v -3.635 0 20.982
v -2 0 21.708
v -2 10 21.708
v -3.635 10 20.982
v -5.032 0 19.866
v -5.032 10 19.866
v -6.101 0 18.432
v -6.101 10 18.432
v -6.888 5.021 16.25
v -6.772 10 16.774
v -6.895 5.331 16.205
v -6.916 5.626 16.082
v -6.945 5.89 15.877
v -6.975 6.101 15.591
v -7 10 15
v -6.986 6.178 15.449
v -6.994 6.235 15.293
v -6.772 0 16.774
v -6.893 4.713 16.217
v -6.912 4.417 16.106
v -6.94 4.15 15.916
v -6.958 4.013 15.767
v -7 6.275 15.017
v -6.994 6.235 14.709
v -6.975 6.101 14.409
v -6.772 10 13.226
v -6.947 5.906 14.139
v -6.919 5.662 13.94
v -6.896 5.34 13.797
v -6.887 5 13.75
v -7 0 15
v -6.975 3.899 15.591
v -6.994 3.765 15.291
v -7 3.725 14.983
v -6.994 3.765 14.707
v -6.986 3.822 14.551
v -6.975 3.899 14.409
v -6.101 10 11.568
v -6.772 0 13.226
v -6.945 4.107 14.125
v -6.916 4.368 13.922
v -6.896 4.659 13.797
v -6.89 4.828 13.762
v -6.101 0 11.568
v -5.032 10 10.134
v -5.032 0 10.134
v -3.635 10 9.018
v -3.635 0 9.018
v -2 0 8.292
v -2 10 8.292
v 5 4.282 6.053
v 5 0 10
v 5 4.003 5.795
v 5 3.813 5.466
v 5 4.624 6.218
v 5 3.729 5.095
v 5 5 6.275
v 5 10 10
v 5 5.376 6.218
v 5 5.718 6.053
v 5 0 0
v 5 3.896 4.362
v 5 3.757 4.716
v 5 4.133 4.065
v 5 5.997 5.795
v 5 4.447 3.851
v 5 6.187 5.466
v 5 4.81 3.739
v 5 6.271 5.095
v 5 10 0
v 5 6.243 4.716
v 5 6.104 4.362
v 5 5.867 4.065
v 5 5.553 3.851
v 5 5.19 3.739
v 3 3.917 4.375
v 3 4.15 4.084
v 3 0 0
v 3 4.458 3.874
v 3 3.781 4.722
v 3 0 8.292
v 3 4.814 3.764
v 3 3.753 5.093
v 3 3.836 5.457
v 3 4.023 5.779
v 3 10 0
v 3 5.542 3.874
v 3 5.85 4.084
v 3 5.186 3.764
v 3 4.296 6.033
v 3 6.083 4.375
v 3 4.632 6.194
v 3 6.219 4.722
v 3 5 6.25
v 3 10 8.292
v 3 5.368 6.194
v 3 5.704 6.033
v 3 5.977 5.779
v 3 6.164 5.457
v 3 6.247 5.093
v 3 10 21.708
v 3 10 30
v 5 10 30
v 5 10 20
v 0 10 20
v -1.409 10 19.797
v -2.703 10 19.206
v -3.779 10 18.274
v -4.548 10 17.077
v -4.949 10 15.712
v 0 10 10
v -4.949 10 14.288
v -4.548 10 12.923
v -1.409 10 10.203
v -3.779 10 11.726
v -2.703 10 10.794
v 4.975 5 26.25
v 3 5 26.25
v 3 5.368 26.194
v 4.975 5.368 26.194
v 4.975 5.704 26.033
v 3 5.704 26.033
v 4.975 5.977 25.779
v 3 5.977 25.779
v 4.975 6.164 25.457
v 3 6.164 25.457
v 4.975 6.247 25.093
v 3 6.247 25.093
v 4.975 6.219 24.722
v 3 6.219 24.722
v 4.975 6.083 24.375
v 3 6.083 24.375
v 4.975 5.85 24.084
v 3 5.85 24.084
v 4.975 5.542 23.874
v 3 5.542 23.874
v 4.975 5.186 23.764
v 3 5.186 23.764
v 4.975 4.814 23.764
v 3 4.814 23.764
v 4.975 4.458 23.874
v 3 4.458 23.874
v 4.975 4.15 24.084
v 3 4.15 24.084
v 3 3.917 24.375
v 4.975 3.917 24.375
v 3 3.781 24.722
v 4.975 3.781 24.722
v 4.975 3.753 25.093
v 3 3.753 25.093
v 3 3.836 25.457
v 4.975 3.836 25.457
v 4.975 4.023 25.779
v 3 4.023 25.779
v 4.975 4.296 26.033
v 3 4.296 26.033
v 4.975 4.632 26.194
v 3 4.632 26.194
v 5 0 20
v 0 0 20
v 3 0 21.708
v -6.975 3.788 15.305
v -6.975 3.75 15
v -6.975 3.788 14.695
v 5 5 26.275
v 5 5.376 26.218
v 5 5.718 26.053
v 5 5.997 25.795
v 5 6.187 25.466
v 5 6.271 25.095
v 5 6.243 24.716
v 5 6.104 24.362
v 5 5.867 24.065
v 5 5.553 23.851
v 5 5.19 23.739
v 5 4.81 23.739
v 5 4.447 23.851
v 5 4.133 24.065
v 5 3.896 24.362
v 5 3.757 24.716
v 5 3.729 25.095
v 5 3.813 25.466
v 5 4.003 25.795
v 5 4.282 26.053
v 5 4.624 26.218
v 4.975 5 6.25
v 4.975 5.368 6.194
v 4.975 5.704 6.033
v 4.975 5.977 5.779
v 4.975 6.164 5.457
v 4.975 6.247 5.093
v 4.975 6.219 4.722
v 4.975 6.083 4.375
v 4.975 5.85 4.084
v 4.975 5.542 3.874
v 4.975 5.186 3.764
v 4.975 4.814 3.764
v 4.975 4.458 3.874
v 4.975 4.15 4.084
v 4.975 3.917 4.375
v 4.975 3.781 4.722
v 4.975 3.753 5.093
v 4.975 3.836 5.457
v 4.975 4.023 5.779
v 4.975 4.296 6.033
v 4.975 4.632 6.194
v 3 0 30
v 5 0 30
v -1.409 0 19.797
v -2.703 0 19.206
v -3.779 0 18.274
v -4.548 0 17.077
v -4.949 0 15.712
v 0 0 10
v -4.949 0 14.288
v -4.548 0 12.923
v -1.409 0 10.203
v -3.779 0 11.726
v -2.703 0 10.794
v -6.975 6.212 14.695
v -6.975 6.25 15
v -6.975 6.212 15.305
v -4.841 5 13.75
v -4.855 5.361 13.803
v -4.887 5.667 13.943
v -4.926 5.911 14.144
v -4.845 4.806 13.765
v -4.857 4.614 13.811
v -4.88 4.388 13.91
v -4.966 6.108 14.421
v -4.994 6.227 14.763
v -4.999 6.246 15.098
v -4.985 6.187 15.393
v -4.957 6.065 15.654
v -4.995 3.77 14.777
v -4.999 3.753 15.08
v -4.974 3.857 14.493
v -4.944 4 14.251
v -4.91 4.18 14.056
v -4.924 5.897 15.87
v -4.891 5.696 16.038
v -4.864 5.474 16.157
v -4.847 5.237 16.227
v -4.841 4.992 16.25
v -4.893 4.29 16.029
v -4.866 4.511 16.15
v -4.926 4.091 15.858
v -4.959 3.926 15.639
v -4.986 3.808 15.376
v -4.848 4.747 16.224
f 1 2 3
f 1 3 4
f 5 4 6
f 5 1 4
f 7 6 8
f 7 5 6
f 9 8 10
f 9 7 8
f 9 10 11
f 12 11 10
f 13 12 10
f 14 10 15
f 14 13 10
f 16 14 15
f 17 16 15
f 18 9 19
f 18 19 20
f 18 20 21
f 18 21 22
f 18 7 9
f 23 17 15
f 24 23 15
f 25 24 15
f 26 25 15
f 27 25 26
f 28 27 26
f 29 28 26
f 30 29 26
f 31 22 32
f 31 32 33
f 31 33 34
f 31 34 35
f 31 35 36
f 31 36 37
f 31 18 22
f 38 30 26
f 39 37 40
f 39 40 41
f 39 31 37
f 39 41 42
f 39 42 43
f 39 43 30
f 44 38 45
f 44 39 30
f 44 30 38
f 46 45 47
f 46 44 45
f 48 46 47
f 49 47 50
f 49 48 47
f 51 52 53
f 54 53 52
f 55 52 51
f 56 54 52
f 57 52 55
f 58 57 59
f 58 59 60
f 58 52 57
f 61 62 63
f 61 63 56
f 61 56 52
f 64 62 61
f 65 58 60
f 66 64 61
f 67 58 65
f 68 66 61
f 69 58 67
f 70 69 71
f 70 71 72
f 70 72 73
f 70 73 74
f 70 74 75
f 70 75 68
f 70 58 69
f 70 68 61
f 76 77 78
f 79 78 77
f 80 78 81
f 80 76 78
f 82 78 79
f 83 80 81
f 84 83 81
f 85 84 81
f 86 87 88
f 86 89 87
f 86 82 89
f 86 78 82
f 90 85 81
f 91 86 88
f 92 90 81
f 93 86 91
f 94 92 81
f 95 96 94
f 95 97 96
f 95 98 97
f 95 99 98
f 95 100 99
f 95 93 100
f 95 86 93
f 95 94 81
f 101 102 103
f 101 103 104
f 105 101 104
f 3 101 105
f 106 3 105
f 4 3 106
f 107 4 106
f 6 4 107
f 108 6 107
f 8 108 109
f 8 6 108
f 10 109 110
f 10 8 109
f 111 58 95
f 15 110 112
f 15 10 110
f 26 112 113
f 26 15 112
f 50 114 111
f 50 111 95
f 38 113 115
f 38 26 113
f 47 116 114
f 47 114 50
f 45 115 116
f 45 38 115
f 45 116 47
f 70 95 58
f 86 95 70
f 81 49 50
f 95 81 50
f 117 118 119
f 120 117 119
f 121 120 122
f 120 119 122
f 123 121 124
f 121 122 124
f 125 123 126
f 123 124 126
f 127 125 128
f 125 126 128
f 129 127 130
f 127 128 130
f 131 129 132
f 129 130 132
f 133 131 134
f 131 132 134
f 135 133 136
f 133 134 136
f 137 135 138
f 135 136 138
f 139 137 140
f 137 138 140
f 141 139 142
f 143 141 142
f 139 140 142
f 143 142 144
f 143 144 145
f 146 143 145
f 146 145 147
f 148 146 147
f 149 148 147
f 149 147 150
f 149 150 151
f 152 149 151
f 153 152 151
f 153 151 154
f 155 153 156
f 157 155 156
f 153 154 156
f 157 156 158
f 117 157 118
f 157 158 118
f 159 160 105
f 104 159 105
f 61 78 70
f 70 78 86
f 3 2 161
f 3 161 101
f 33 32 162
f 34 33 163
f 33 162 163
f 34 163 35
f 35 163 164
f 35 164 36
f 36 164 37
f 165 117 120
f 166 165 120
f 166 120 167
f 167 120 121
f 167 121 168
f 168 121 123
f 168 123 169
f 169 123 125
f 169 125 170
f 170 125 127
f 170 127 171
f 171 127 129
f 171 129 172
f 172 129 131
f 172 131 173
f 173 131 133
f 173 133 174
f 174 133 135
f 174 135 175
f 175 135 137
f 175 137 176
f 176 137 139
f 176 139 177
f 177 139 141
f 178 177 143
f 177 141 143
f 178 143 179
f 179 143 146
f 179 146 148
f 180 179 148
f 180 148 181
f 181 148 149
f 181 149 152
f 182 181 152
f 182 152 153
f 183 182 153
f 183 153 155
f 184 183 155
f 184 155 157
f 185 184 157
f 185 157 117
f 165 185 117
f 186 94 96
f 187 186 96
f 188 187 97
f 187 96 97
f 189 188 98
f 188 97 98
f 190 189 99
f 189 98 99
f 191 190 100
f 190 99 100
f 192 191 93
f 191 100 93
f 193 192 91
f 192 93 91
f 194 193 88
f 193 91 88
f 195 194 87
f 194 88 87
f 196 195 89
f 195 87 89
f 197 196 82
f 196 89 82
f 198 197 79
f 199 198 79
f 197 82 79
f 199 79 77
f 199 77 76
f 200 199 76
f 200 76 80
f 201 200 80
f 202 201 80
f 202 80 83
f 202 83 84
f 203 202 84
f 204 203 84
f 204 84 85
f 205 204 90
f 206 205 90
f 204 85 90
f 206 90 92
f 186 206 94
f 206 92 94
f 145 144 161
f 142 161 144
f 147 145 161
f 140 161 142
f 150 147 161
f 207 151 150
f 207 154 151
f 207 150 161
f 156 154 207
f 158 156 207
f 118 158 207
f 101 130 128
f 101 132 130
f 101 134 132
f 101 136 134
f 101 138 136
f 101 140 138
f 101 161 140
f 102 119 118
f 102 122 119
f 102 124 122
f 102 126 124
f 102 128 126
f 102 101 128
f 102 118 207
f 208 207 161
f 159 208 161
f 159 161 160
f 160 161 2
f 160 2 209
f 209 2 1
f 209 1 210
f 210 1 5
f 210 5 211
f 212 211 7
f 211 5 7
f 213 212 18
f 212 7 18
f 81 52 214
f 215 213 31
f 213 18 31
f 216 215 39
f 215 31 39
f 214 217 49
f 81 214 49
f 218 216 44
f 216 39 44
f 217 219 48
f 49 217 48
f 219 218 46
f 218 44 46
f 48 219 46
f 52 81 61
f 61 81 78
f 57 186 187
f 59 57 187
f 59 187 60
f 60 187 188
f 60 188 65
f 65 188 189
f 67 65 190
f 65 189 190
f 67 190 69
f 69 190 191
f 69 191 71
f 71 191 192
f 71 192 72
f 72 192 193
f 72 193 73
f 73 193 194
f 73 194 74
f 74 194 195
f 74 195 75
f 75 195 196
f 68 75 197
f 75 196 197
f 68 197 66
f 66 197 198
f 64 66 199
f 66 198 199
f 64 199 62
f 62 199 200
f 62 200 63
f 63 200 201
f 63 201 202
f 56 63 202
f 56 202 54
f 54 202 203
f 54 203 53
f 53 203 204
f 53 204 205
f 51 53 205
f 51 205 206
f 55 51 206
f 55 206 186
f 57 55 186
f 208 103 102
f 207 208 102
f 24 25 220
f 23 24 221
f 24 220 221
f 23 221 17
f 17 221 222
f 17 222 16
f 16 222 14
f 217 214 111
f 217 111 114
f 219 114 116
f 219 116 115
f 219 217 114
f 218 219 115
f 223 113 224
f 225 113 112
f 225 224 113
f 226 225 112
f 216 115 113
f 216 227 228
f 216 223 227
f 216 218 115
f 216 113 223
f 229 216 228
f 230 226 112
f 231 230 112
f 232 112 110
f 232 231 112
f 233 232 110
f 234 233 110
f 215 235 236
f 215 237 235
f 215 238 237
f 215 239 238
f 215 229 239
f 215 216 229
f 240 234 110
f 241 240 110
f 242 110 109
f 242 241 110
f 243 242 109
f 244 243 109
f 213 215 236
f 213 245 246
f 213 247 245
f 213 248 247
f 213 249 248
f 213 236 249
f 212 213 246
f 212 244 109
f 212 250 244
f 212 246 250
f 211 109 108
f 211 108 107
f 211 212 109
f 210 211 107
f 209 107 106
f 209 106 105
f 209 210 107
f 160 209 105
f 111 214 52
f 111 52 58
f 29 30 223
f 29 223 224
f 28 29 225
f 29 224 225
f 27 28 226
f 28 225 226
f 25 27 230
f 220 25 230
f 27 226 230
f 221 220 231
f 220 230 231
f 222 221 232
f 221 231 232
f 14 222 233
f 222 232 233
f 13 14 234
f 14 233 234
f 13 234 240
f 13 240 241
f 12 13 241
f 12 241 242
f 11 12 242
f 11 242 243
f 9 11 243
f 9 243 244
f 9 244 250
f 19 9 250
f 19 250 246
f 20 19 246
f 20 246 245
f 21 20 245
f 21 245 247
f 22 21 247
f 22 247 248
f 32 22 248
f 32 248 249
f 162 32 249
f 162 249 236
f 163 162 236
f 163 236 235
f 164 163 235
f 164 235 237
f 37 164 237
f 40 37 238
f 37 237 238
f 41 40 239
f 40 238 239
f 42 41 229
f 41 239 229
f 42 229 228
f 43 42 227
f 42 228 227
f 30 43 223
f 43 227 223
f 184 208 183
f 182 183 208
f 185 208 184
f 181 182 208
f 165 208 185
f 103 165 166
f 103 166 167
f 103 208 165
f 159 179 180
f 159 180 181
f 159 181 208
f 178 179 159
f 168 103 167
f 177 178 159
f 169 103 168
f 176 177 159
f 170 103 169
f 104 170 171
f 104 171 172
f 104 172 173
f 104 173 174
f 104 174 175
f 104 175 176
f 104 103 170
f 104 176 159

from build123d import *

# Parameters (mm, degrees)
EXTRUDE_1_DEPTH              = 10
HOLE_WIZARD_M3_2_D           = 2.5
HOLE_WIZARD_M3_2_CSINK_D     = 2.55
HOLE_WIZARD_M3_2_CSINK_ANGLE = 90
SKETCH_15_W                  = 10
SKETCH_15_H                  = 10
EXTRUDE_2_DEPTH              = 5
HOLE_WIZARD_M3_1_D           = 2.5
HOLE_WIZARD_M3_1_CSINK_D     = 2.55
HOLE_WIZARD_M3_1_CSINK_ANGLE = 90
SKETCH_21_W                  = 8.291796068
SKETCH_21_H                  = 10
CUT_EXTRUDE_2_DEPTH          = 5


with BuildPart() as part:
    # 草图1 → 凸台-拉伸1 (new body)
    with BuildSketch(Plane(origin=(0, 0, 0), x_dir=(1, 0, 0), z_dir=(0, 1, 0))):
        with BuildLine():
            Line((0, 0), (0, -10))
            ThreePointArc((0, -10), (-5, -15), (0, -20))
            Line((0, -20), (0, -30))
            Line((0, -30), (-2, -30))
            Line((-2, -30), (-2, -21.708203932))
            ThreePointArc((-2, -21.708203932), (-7, -15), (-2, -8.291796068))
            Line((-2, -8.291796068), (-2, 0))
            Line((-2, 0), (0, 0))
        make_face()
    extrude(amount=EXTRUDE_1_DEPTH)

    # M3 螺纹孔的螺纹孔钻头2 (through all)
    with Locations(Plane.ZY.offset(7)):
        with Locations((15, 5)):
            CounterSinkHole(HOLE_WIZARD_M3_2_D / 2, HOLE_WIZARD_M3_2_CSINK_D / 2, counter_sink_angle=HOLE_WIZARD_M3_2_CSINK_ANGLE)

    # 草图15 → 凸台-拉伸2 (add)
    with BuildSketch(Plane(origin=(0, 0, 0), x_dir=(0, 0, -1), z_dir=(1, 0, 0))):
        with Locations((-5, 5)):
            Rectangle(SKETCH_15_W, SKETCH_15_H)
        with Locations((-25, 5)):
            Rectangle(SKETCH_15_W, SKETCH_15_H)
    extrude(amount=EXTRUDE_2_DEPTH)

    # M3 螺纹孔的螺纹孔钻头1 (through all)
    with Locations(Plane(origin=(5, 0, 0), x_dir=(0, 0, -1), z_dir=(1, 0, 0))):
        with Locations((-5, 5), (-25, 5)):
            CounterSinkHole(HOLE_WIZARD_M3_1_D / 2, HOLE_WIZARD_M3_1_CSINK_D / 2, counter_sink_angle=HOLE_WIZARD_M3_1_CSINK_ANGLE)

    # 草图21 → 切除-拉伸2 (cut)
    with BuildSketch(Plane.ZY.offset(2)):
        with Locations((4.145898034, 5)):
            Rectangle(SKETCH_21_W, SKETCH_21_H)
        with Locations((25.854101966, 5)):
            Rectangle(SKETCH_21_W, SKETCH_21_H)
    extrude(amount=-CUT_EXTRUDE_2_DEPTH, mode=Mode.SUBTRACT)


solid = part.part
